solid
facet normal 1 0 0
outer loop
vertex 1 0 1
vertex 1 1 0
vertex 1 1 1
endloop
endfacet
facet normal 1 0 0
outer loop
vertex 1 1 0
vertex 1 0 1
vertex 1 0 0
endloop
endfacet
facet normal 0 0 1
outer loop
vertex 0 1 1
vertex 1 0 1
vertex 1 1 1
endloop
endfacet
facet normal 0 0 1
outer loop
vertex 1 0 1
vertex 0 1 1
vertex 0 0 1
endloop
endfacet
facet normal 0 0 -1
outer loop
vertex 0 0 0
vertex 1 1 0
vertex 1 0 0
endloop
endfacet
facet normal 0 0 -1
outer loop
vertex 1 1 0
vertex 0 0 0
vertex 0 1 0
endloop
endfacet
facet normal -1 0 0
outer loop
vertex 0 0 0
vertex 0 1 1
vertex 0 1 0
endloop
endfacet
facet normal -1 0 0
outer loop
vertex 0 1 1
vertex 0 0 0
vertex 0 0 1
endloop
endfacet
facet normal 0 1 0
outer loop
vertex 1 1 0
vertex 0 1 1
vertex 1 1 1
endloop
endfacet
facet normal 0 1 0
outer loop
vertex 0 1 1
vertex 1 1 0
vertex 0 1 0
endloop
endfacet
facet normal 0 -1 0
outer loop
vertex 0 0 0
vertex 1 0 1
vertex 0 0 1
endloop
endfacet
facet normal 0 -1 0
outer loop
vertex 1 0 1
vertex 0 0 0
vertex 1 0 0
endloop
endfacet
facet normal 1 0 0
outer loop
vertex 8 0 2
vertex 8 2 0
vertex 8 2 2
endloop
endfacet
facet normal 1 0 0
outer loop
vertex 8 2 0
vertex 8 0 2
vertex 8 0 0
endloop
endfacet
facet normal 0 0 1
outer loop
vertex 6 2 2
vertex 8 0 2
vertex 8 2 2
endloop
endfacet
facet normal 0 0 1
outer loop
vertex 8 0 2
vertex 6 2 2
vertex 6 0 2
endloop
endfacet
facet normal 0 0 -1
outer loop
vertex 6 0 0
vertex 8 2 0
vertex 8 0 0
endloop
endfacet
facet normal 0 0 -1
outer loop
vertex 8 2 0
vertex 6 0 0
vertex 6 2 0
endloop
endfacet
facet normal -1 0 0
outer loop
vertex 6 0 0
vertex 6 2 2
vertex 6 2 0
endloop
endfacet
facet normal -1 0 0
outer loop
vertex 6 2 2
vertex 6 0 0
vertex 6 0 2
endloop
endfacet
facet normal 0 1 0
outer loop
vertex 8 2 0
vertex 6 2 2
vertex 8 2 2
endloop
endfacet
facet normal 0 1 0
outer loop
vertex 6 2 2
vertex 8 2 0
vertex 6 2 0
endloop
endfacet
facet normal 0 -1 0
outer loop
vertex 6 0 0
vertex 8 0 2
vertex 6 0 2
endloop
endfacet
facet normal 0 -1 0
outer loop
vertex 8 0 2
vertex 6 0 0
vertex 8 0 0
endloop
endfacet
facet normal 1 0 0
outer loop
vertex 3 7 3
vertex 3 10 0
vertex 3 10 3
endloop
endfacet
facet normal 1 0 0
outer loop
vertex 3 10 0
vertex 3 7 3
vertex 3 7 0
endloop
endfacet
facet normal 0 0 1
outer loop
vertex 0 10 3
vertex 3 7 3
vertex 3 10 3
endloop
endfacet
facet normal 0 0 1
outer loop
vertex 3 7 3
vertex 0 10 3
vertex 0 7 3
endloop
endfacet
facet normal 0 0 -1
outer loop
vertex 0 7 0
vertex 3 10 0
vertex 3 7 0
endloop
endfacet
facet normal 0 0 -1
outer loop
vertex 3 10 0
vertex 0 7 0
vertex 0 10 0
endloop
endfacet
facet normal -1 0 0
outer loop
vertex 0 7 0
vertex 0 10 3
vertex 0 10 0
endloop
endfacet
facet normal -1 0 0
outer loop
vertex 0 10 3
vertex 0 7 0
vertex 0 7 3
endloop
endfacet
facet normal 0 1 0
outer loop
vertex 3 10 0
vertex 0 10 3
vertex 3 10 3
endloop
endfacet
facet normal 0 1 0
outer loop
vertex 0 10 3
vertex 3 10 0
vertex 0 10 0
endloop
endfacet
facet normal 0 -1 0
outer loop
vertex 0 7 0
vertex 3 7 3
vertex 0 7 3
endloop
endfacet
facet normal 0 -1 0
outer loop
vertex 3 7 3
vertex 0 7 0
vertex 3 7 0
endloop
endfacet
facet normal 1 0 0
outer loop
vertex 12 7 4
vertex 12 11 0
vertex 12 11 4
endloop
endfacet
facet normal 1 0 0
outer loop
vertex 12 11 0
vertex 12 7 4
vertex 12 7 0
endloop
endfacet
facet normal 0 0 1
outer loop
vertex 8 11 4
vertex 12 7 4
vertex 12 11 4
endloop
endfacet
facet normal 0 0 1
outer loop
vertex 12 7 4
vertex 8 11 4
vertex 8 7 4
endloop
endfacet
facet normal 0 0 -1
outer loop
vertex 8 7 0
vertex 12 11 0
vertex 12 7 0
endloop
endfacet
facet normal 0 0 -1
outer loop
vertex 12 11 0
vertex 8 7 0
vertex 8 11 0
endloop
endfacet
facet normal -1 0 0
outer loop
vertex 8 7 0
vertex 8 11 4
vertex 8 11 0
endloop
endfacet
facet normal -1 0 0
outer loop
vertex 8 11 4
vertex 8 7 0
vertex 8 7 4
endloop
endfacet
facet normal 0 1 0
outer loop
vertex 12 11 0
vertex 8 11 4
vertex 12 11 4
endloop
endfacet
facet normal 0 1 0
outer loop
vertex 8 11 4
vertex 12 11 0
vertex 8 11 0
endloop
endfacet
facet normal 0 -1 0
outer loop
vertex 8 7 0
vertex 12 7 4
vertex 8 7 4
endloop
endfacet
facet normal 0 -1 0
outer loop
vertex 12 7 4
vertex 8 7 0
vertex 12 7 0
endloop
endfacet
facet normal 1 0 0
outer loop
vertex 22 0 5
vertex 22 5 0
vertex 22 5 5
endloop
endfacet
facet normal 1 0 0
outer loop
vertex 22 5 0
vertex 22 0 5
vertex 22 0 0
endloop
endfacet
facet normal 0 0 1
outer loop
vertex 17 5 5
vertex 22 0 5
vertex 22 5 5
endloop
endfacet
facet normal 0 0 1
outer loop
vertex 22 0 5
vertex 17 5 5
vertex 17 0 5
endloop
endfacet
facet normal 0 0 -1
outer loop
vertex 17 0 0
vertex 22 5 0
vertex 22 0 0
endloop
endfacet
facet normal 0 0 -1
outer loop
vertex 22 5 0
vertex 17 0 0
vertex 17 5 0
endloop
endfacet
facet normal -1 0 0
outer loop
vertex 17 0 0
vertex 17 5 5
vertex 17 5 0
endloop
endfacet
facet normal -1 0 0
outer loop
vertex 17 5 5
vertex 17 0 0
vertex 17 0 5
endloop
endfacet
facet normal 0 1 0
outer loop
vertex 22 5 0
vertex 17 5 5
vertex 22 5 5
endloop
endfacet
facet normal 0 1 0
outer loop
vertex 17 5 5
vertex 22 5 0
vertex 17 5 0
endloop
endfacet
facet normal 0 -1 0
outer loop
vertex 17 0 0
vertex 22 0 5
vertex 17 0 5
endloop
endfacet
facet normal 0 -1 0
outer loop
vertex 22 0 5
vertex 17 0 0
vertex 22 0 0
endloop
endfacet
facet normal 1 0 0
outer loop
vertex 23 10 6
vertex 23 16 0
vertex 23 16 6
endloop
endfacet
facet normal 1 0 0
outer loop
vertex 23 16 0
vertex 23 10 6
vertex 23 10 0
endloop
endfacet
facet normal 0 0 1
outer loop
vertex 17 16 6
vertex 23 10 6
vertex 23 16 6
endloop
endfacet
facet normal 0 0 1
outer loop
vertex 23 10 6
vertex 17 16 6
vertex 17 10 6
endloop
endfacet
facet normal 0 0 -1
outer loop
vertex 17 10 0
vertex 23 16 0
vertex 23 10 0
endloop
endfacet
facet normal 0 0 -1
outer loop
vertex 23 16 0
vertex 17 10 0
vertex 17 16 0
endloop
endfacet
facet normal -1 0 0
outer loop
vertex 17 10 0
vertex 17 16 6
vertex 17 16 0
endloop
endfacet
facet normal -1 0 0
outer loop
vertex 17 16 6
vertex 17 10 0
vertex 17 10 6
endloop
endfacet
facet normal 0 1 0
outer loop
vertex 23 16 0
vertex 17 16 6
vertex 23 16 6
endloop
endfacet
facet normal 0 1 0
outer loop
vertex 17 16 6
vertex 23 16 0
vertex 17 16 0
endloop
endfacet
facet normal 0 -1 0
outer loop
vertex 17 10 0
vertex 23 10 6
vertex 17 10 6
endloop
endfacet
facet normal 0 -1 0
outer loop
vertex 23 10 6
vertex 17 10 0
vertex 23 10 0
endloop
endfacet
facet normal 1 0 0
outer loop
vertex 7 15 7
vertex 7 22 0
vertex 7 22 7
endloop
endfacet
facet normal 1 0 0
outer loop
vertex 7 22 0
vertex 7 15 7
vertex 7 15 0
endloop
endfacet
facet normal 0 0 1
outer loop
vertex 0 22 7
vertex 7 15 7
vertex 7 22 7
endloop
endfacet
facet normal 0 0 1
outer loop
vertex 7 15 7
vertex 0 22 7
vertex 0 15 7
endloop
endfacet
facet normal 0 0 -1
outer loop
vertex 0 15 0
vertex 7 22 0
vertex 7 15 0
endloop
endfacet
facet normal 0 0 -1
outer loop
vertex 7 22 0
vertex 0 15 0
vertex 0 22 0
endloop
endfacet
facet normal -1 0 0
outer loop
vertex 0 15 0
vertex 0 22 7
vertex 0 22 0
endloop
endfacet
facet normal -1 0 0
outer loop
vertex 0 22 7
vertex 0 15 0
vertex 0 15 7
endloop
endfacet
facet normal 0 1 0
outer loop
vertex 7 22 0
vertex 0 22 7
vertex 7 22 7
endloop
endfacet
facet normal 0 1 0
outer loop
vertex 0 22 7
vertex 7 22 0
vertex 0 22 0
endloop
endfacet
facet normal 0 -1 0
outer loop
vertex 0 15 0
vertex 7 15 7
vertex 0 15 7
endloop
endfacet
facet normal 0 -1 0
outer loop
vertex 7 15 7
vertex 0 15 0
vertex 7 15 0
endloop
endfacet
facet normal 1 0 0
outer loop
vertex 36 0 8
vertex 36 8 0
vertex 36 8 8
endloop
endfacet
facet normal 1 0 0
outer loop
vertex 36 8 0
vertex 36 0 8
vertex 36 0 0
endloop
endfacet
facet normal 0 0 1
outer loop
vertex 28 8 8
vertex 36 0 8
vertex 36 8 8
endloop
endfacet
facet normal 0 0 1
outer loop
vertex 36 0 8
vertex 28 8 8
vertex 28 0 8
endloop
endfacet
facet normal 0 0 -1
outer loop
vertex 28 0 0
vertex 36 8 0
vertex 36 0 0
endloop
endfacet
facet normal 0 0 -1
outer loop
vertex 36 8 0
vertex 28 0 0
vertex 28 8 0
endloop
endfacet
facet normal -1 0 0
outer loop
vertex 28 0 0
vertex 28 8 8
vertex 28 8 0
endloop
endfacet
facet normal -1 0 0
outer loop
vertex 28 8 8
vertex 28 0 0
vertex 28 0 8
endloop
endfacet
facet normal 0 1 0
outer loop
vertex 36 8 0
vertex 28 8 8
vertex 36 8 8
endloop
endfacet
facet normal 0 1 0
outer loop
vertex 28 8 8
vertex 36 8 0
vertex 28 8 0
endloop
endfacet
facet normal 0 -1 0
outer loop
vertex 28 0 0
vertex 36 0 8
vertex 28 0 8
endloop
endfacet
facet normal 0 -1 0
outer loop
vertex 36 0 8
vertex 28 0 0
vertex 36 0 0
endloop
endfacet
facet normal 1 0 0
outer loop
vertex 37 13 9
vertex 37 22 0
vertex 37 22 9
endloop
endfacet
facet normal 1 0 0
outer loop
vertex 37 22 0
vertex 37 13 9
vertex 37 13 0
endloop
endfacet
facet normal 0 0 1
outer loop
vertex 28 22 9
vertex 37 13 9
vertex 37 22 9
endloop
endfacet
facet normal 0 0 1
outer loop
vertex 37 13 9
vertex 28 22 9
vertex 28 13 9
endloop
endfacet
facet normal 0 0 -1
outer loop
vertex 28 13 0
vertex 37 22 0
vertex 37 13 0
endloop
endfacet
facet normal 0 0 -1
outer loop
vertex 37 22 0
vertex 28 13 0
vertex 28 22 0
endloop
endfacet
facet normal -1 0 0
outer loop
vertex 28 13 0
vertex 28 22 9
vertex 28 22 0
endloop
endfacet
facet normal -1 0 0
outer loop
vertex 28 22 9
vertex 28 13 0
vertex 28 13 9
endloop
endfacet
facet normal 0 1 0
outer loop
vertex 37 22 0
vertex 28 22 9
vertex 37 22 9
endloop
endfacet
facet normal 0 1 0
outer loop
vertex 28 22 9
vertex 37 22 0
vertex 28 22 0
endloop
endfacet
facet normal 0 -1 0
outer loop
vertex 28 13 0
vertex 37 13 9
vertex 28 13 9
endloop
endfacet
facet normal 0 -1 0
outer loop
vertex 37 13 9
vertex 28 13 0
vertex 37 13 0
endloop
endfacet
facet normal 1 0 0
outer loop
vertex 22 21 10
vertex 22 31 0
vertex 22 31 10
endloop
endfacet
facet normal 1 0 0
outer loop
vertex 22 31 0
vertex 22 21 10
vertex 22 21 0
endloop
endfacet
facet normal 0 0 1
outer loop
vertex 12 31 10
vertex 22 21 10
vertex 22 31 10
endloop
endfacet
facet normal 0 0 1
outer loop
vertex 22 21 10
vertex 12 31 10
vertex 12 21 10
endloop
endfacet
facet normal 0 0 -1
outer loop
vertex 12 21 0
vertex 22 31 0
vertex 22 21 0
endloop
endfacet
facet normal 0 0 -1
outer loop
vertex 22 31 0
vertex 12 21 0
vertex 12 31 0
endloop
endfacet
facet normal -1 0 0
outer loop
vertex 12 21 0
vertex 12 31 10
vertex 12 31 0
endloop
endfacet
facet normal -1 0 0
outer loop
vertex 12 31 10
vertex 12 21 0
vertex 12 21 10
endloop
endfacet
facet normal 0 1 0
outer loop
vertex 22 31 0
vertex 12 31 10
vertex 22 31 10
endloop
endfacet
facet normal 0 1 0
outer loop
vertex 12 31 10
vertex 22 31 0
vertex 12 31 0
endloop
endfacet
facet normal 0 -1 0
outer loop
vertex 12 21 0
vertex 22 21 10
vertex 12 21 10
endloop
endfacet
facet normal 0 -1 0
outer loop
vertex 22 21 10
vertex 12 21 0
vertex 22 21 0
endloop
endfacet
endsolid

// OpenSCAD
cube(1);

translate([6,0,0])
cube(2);

translate([0,7,0])
cube(3);

translate([8,7,0])
cube(4);

translate([17,0,0])
cube(5);

translate([17,10,0])
cube(6);

translate([0,15,0])
cube(7);

translate([28,0,0])
cube(8);

translate([28,13,0])
cube(9);

translate([12,21,0])
cube(10);
